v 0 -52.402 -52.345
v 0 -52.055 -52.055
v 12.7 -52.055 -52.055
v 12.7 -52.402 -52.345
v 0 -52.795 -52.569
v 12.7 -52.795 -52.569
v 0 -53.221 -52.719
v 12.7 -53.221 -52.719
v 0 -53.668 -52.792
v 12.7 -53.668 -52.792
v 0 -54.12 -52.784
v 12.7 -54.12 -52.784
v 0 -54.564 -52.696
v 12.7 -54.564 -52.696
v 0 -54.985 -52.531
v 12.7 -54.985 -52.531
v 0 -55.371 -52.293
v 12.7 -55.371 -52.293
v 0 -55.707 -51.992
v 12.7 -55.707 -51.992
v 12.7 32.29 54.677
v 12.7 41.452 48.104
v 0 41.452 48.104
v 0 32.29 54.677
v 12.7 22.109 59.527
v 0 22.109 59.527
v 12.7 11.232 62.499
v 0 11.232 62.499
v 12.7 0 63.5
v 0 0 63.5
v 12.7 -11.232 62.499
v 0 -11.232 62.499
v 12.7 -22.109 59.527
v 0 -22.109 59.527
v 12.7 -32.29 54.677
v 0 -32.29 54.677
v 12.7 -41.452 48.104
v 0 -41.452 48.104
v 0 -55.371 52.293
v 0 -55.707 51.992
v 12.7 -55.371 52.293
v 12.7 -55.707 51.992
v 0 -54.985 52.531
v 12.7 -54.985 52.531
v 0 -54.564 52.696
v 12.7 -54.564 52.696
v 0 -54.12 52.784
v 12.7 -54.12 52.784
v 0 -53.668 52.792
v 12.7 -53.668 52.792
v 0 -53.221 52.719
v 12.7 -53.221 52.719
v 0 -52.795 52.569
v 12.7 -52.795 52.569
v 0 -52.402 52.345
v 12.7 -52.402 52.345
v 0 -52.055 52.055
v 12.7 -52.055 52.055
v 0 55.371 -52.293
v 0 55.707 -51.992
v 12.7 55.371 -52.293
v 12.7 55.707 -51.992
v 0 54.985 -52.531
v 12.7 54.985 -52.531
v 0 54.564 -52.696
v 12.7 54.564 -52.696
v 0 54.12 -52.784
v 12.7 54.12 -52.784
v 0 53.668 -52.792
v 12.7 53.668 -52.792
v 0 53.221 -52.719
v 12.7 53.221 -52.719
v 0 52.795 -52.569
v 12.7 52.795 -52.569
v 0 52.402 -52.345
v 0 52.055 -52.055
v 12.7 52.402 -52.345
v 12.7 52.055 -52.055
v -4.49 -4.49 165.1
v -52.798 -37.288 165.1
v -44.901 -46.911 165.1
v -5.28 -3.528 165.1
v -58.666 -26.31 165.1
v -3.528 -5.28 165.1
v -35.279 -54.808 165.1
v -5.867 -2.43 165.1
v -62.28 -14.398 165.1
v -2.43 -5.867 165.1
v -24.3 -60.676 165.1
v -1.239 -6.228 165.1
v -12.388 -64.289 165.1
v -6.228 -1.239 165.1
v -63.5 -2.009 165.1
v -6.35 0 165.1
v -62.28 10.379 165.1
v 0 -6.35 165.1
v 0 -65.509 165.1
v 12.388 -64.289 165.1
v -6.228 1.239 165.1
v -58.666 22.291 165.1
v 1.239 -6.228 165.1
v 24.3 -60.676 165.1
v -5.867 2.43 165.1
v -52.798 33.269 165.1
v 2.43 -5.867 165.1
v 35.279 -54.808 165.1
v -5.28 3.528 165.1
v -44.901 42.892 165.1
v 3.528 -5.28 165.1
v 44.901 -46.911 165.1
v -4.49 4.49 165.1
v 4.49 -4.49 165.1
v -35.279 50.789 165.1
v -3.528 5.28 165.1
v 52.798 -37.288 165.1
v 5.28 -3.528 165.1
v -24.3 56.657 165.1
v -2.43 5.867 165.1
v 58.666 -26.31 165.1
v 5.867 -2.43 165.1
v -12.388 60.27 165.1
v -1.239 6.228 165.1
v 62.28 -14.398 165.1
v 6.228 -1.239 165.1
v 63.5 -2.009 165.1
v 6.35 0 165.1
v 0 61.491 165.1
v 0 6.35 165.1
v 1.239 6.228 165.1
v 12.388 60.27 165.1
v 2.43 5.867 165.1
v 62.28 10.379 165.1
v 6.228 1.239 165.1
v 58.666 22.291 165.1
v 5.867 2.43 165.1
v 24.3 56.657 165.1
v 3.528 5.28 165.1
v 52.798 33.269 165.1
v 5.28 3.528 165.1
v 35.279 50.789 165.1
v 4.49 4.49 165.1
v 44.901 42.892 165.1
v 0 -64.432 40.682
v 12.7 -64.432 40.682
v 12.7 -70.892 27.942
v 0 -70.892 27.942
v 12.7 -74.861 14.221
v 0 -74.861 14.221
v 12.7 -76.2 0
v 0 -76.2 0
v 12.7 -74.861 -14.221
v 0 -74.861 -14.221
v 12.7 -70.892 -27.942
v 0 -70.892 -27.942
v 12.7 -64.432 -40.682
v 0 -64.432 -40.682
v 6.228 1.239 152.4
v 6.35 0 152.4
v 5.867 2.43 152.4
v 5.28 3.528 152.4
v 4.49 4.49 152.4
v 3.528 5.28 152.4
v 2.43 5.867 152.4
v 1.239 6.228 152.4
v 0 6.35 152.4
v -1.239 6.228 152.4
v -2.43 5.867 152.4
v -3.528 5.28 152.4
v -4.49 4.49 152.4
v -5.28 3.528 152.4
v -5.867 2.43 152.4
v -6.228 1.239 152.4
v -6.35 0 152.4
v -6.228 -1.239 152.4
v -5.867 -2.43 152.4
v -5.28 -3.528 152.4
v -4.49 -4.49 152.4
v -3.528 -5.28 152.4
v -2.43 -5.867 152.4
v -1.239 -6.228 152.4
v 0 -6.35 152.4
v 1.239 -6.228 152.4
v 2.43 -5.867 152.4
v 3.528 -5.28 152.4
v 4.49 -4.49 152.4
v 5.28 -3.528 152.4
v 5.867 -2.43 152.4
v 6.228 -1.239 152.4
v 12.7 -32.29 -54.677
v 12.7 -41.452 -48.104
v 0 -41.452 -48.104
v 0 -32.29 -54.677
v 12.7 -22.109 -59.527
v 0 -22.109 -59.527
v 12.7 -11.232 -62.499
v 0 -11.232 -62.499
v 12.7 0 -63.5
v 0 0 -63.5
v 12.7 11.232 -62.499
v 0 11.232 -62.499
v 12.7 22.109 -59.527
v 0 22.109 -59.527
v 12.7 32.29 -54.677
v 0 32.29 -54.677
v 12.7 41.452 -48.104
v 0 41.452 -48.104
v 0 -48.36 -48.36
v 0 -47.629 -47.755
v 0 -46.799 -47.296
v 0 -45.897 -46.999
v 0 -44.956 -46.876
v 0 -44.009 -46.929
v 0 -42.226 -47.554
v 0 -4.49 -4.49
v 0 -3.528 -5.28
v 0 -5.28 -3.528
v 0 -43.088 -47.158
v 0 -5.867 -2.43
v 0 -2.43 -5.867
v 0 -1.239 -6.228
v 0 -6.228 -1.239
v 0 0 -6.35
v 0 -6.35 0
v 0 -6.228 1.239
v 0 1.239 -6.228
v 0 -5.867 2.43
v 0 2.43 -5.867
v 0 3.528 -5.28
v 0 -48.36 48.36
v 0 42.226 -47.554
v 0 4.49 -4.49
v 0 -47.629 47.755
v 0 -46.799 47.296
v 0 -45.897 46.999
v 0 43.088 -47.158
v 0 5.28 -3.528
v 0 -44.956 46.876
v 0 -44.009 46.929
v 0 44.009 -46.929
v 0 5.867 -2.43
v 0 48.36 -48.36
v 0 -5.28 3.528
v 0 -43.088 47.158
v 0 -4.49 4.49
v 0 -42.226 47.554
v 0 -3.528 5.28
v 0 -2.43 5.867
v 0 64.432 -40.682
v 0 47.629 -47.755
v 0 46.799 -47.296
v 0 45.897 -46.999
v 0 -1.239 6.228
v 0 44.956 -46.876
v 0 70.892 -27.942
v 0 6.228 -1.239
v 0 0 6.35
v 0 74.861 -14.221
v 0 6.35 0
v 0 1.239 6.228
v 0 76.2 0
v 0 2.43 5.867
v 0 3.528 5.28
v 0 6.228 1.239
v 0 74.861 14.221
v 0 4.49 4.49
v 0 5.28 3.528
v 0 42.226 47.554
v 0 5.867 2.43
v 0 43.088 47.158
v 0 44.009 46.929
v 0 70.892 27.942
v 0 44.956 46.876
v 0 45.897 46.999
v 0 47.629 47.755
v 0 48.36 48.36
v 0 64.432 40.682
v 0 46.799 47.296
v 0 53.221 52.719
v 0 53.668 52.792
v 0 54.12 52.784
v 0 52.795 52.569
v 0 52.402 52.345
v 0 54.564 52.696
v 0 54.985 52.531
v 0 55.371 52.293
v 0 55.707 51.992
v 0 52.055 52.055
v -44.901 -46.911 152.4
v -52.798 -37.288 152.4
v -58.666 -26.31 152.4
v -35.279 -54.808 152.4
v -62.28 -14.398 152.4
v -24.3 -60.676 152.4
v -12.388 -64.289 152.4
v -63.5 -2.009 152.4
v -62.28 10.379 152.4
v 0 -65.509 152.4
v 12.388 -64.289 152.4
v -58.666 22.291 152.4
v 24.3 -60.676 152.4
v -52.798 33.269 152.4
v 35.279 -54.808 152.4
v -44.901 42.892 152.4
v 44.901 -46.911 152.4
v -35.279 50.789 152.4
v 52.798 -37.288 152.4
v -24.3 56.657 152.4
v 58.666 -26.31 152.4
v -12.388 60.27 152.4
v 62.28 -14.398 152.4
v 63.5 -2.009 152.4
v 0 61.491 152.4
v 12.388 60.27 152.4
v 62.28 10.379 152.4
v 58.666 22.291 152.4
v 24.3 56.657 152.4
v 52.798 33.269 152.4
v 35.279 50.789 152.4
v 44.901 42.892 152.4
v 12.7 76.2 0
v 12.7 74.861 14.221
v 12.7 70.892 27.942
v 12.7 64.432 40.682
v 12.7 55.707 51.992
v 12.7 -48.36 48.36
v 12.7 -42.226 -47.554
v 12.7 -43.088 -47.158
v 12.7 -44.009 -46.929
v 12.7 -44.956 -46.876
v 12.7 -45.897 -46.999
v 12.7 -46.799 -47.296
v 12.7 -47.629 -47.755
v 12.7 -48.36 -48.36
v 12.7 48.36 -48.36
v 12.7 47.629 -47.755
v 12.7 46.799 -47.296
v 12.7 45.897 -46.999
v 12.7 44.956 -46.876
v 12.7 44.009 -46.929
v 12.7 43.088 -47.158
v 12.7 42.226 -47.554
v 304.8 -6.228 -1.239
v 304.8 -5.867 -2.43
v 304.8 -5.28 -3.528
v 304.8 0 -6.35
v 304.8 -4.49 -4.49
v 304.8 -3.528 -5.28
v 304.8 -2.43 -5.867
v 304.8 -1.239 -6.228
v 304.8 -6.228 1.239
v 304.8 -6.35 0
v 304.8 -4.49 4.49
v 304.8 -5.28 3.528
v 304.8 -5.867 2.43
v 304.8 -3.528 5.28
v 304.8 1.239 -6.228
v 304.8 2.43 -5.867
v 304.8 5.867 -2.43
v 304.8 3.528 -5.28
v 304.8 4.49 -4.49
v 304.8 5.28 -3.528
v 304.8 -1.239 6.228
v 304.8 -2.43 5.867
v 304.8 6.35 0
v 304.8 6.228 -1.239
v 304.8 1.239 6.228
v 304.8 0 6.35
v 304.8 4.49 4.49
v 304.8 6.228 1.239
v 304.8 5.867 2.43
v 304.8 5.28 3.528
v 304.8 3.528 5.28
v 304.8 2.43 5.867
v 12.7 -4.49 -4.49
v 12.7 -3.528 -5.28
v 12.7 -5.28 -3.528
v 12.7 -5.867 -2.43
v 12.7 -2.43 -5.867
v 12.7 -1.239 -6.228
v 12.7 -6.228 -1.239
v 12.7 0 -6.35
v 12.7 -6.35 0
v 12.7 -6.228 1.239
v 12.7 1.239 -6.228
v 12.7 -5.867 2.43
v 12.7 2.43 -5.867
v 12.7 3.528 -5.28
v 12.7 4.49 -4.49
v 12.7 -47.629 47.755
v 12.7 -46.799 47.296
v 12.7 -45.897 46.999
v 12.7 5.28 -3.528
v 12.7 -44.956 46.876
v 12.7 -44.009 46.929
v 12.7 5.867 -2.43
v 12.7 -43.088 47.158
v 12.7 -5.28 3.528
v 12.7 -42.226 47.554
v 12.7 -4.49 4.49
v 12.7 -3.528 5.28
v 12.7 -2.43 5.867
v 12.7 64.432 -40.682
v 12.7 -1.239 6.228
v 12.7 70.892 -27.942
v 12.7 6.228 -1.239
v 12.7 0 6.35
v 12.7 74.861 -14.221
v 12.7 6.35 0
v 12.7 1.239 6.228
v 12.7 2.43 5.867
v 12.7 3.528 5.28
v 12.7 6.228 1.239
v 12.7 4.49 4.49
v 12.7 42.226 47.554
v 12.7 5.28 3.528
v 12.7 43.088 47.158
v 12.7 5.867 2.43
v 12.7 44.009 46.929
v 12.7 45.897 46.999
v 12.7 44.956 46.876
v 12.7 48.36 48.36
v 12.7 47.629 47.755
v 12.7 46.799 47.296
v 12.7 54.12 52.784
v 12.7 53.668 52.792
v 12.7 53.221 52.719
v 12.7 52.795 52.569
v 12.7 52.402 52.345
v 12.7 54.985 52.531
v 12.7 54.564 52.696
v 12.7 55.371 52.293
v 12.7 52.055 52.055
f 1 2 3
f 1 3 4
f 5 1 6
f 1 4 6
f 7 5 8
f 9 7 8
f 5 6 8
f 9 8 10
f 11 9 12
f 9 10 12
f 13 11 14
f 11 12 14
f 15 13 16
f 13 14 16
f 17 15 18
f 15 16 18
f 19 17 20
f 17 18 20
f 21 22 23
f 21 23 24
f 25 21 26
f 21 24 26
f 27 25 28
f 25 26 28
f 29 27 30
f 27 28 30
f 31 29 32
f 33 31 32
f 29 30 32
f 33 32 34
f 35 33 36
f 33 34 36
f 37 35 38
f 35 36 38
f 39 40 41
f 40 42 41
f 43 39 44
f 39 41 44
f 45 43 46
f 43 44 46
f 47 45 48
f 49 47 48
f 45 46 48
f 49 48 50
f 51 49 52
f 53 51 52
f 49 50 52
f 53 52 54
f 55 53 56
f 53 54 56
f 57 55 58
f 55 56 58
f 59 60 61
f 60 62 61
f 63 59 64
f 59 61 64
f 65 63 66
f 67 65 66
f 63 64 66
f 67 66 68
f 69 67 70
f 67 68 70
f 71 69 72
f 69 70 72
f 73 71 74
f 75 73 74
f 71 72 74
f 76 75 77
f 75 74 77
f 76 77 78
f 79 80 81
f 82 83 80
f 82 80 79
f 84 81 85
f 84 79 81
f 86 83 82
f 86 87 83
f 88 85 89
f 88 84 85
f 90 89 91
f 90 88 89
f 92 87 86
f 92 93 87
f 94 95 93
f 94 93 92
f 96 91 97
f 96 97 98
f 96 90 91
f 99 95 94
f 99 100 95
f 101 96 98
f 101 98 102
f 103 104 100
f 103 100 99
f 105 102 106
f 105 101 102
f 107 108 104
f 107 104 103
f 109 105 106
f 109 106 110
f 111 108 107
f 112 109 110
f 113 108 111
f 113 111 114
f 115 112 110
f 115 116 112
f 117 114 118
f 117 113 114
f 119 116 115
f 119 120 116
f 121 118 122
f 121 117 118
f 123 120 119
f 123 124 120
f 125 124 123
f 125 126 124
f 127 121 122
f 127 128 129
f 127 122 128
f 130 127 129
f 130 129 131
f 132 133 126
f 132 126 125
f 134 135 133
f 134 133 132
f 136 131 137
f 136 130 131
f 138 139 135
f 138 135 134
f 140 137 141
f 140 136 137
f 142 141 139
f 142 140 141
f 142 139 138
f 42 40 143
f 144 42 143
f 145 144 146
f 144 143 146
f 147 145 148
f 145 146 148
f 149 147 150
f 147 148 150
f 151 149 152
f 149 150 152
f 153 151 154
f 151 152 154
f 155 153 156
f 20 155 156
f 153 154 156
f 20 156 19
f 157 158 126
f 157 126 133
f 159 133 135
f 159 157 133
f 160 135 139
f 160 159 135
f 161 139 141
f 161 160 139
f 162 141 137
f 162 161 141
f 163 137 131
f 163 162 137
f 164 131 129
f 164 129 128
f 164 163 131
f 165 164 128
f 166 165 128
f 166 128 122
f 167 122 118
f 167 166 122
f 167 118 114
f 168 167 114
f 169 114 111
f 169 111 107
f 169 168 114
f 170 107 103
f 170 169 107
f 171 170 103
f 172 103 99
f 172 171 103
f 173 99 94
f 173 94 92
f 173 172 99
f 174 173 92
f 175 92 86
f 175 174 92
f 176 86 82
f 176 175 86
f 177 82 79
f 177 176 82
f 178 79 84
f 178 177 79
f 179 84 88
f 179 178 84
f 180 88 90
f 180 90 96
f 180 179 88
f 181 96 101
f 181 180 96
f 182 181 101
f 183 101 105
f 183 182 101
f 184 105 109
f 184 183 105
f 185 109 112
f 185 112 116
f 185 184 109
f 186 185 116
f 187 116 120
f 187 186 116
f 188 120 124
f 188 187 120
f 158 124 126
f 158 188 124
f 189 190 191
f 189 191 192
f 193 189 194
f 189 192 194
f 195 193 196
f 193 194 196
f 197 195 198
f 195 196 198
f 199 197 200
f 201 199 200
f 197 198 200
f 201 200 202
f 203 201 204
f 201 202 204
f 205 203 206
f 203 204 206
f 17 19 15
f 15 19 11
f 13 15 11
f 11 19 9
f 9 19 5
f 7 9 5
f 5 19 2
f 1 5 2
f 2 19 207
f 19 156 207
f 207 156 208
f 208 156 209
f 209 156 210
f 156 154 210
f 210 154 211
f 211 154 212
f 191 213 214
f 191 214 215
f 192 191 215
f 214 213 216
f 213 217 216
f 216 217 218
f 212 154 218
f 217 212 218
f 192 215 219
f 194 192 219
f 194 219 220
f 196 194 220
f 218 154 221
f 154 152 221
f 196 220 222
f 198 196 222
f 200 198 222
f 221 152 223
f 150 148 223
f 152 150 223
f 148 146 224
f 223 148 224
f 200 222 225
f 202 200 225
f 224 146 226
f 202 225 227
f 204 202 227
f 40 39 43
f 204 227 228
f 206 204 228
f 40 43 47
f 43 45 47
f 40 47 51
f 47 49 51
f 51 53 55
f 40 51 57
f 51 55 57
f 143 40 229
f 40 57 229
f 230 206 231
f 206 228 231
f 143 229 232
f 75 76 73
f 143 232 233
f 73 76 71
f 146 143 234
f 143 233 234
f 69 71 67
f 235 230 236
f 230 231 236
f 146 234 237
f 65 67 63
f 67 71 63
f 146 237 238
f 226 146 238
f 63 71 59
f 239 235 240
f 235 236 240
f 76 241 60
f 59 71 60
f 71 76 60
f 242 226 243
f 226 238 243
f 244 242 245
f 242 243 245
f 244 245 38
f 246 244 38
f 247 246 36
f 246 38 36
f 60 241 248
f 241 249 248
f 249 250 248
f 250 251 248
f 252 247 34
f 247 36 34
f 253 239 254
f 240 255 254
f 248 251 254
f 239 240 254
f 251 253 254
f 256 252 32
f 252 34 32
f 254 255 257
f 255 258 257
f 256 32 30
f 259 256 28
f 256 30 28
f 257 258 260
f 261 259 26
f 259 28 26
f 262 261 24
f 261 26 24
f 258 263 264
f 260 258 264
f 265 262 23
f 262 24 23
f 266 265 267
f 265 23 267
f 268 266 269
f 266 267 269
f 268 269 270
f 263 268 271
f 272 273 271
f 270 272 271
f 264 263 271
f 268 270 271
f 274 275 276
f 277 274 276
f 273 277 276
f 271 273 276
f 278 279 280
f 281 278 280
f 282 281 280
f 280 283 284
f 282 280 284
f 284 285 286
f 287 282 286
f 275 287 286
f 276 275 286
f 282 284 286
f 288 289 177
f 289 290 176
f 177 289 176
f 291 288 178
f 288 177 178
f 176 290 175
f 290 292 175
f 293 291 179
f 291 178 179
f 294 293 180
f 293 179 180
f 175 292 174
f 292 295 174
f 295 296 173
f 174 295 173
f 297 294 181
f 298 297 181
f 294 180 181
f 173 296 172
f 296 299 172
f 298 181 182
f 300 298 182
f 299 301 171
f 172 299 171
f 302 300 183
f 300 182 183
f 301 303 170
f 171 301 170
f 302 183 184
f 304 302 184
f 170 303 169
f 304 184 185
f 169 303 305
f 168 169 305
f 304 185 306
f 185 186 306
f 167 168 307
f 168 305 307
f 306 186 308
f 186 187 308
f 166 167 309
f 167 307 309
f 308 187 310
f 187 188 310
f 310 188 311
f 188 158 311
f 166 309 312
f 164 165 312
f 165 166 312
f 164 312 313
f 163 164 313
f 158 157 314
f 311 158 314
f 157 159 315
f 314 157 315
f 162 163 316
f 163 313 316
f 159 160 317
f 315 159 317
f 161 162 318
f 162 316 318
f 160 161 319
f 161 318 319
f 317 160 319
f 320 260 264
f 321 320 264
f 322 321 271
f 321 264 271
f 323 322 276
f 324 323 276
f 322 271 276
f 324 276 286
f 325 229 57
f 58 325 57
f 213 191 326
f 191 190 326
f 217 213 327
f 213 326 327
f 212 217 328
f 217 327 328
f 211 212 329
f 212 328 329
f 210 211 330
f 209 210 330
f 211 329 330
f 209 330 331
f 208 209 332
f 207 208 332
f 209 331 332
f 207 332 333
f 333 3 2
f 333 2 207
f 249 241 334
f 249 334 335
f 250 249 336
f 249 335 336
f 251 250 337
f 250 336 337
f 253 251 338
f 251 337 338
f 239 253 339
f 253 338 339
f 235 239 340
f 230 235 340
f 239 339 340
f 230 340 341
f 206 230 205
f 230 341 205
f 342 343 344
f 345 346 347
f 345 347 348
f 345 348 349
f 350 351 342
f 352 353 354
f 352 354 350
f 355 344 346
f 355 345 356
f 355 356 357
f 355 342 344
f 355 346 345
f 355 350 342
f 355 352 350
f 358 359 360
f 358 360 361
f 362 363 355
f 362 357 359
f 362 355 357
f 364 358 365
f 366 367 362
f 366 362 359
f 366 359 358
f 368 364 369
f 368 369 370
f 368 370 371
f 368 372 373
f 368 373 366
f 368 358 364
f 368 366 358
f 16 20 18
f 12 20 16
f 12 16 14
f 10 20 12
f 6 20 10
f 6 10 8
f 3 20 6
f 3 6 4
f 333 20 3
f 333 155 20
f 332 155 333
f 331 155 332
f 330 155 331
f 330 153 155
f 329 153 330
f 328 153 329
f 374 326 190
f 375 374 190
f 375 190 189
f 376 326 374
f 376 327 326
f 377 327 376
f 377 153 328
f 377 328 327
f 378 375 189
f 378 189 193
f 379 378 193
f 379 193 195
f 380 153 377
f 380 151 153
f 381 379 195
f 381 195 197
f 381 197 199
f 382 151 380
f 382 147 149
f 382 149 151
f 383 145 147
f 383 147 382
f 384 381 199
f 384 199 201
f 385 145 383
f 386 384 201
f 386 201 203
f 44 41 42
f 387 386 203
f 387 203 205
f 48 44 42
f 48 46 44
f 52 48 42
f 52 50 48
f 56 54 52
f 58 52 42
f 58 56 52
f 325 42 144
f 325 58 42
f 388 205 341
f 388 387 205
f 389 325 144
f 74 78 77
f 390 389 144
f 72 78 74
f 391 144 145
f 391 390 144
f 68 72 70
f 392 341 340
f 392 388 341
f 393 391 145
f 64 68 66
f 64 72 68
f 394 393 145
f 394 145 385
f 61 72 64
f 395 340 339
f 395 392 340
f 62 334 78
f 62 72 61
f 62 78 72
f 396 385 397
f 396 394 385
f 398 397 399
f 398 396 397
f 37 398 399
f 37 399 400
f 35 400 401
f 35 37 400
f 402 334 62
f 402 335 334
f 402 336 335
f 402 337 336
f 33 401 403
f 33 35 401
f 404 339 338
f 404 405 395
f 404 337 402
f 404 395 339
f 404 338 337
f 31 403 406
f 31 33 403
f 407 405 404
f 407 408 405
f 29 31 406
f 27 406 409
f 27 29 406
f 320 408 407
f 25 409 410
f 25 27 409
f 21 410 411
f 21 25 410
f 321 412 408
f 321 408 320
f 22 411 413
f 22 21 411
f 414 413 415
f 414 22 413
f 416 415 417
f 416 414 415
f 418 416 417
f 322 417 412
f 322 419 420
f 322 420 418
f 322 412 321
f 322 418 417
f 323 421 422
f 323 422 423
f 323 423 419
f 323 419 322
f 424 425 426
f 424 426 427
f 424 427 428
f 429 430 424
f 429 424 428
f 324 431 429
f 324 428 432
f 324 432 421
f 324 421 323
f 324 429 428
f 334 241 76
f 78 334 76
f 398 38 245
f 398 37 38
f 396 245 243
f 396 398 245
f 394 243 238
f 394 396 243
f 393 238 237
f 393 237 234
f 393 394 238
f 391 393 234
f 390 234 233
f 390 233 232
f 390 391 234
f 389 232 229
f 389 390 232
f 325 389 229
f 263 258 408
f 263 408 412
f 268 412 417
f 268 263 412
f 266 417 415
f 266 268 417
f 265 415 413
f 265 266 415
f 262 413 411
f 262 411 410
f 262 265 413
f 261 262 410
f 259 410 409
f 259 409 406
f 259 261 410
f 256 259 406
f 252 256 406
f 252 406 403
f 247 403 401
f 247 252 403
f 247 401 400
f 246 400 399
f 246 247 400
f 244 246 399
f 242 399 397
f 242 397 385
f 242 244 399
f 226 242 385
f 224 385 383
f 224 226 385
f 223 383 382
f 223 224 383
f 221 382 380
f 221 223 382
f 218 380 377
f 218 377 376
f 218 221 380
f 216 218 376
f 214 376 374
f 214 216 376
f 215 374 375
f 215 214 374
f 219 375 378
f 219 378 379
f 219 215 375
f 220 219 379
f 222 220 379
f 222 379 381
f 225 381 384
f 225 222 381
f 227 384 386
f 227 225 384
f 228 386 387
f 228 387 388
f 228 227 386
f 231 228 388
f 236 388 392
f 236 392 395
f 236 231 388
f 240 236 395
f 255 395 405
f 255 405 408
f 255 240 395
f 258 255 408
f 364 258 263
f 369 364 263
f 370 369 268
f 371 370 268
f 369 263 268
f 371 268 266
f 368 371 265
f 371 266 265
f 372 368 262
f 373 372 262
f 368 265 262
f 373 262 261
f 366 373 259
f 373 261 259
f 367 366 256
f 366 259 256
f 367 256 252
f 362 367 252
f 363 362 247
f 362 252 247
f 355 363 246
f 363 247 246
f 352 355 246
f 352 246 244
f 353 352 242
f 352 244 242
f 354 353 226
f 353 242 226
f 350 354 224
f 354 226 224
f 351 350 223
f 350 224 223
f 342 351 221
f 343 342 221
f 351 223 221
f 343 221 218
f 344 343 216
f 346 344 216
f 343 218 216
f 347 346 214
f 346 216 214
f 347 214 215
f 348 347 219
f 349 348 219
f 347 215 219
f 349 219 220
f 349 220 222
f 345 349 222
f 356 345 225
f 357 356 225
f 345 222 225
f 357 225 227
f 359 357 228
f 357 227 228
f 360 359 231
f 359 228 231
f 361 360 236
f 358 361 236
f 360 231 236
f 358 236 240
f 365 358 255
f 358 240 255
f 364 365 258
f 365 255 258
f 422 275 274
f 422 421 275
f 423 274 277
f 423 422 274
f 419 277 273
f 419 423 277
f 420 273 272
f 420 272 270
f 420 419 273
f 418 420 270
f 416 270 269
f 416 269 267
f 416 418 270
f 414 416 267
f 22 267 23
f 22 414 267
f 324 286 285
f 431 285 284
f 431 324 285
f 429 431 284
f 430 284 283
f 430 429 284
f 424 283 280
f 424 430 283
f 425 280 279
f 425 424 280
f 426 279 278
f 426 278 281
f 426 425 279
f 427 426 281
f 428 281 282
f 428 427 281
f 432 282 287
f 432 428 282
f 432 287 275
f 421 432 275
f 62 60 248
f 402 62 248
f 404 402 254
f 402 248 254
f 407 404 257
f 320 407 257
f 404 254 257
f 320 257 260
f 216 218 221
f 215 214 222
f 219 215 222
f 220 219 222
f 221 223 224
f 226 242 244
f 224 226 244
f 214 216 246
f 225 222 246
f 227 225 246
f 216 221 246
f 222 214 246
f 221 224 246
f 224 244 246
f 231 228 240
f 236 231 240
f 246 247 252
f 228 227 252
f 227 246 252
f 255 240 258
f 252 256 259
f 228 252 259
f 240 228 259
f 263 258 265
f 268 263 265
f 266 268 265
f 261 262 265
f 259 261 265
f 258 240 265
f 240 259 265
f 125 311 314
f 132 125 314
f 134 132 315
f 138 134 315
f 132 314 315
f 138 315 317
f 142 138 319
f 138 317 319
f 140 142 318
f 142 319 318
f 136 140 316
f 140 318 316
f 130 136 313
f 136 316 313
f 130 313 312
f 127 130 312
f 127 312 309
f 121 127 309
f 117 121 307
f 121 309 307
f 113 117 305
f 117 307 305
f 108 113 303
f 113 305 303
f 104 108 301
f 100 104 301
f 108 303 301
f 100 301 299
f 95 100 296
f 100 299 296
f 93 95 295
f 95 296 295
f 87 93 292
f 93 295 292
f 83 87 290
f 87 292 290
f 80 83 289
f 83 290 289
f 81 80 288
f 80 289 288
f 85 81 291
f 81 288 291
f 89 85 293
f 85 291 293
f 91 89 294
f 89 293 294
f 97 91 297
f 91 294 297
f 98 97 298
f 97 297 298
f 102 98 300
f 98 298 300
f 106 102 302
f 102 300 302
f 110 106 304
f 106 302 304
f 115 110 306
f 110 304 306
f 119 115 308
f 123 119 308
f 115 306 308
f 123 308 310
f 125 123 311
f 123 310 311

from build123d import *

# Parameters (mm, degrees)
F0_R     = 6.35
F1_DEPTH = 12.7
F2_R     = 2.54
F3_R     = 5.08
F5_DEPTH = 304.8
F6_R     = 63.5
F6_R_2   = 6.35
F7_DEPTH = 12.7


with BuildPart() as f1:
    # F0 (on Right) → F1 (new body)
    with BuildSketch(Plane.YZ):
        with BuildLine():
            ThreePointArc((53.881537, -53.881537), (70.39962, -29.160478), (76.2, 0))
            ThreePointArc((76.2, 0), (70.39962, 29.160478), (53.881537, 53.881537))
            Line((53.881537, 53.881537), (44.901281, 44.901281))
            ThreePointArc((44.901281, 44.901281), (0, 63.5), (-44.901281, 44.901281))
            Line((-44.901281, 44.901281), (-53.881537, 53.881537))
            ThreePointArc((-53.881537, 53.881537), (-76.2, 0), (-53.881537, -53.881537))
            Line((-53.881537, -53.881537), (-44.901281, -44.901281))
            ThreePointArc((-44.901281, -44.901281), (0, -63.5), (44.901281, -44.901281))
            Line((44.901281, -44.901281), (53.881537, -53.881537))
        make_face()
        Circle(F0_R, mode=Mode.SUBTRACT)
    extrude(amount=F1_DEPTH)

    # F2
    f2_edges = [f1.edges().sort_by_distance(p)[0] for p in [
        (6.35, -53.881537, 53.881537),
        (6.35, 53.881537, 53.881537),
        (6.35, -53.881537, -53.881537),
        (6.35, 53.881537, -53.881537),
    ]]
    fillet(f2_edges, radius=F2_R)

    # F3
    f3_edges = [f1.edges().sort_by_distance(p)[0] for p in [
        (6.35, -44.901281, -44.901281),
        (6.35, 44.901281, -44.901281),
        (6.35, 44.901281, 44.901281),
        (6.35, -44.901281, 44.901281),
    ]]
    fillet(f3_edges, radius=F3_R)


with BuildPart() as f5:
    # F0 (on Right) → F5 (new body)
    with BuildSketch(Plane.YZ):
        Circle(F0_R)
    extrude(amount=F5_DEPTH)


with BuildPart() as f7:
    # F6 (on offset) → F7 (new body)
    with BuildSketch(Plane.XY.offset(152.4)):
        with Locations((0, -2.009471)):
            Circle(F6_R)
        Circle(F6_R_2, mode=Mode.SUBTRACT)
    extrude(amount=F7_DEPTH)


solid = Compound([f1.part, f5.part, f7.part])
